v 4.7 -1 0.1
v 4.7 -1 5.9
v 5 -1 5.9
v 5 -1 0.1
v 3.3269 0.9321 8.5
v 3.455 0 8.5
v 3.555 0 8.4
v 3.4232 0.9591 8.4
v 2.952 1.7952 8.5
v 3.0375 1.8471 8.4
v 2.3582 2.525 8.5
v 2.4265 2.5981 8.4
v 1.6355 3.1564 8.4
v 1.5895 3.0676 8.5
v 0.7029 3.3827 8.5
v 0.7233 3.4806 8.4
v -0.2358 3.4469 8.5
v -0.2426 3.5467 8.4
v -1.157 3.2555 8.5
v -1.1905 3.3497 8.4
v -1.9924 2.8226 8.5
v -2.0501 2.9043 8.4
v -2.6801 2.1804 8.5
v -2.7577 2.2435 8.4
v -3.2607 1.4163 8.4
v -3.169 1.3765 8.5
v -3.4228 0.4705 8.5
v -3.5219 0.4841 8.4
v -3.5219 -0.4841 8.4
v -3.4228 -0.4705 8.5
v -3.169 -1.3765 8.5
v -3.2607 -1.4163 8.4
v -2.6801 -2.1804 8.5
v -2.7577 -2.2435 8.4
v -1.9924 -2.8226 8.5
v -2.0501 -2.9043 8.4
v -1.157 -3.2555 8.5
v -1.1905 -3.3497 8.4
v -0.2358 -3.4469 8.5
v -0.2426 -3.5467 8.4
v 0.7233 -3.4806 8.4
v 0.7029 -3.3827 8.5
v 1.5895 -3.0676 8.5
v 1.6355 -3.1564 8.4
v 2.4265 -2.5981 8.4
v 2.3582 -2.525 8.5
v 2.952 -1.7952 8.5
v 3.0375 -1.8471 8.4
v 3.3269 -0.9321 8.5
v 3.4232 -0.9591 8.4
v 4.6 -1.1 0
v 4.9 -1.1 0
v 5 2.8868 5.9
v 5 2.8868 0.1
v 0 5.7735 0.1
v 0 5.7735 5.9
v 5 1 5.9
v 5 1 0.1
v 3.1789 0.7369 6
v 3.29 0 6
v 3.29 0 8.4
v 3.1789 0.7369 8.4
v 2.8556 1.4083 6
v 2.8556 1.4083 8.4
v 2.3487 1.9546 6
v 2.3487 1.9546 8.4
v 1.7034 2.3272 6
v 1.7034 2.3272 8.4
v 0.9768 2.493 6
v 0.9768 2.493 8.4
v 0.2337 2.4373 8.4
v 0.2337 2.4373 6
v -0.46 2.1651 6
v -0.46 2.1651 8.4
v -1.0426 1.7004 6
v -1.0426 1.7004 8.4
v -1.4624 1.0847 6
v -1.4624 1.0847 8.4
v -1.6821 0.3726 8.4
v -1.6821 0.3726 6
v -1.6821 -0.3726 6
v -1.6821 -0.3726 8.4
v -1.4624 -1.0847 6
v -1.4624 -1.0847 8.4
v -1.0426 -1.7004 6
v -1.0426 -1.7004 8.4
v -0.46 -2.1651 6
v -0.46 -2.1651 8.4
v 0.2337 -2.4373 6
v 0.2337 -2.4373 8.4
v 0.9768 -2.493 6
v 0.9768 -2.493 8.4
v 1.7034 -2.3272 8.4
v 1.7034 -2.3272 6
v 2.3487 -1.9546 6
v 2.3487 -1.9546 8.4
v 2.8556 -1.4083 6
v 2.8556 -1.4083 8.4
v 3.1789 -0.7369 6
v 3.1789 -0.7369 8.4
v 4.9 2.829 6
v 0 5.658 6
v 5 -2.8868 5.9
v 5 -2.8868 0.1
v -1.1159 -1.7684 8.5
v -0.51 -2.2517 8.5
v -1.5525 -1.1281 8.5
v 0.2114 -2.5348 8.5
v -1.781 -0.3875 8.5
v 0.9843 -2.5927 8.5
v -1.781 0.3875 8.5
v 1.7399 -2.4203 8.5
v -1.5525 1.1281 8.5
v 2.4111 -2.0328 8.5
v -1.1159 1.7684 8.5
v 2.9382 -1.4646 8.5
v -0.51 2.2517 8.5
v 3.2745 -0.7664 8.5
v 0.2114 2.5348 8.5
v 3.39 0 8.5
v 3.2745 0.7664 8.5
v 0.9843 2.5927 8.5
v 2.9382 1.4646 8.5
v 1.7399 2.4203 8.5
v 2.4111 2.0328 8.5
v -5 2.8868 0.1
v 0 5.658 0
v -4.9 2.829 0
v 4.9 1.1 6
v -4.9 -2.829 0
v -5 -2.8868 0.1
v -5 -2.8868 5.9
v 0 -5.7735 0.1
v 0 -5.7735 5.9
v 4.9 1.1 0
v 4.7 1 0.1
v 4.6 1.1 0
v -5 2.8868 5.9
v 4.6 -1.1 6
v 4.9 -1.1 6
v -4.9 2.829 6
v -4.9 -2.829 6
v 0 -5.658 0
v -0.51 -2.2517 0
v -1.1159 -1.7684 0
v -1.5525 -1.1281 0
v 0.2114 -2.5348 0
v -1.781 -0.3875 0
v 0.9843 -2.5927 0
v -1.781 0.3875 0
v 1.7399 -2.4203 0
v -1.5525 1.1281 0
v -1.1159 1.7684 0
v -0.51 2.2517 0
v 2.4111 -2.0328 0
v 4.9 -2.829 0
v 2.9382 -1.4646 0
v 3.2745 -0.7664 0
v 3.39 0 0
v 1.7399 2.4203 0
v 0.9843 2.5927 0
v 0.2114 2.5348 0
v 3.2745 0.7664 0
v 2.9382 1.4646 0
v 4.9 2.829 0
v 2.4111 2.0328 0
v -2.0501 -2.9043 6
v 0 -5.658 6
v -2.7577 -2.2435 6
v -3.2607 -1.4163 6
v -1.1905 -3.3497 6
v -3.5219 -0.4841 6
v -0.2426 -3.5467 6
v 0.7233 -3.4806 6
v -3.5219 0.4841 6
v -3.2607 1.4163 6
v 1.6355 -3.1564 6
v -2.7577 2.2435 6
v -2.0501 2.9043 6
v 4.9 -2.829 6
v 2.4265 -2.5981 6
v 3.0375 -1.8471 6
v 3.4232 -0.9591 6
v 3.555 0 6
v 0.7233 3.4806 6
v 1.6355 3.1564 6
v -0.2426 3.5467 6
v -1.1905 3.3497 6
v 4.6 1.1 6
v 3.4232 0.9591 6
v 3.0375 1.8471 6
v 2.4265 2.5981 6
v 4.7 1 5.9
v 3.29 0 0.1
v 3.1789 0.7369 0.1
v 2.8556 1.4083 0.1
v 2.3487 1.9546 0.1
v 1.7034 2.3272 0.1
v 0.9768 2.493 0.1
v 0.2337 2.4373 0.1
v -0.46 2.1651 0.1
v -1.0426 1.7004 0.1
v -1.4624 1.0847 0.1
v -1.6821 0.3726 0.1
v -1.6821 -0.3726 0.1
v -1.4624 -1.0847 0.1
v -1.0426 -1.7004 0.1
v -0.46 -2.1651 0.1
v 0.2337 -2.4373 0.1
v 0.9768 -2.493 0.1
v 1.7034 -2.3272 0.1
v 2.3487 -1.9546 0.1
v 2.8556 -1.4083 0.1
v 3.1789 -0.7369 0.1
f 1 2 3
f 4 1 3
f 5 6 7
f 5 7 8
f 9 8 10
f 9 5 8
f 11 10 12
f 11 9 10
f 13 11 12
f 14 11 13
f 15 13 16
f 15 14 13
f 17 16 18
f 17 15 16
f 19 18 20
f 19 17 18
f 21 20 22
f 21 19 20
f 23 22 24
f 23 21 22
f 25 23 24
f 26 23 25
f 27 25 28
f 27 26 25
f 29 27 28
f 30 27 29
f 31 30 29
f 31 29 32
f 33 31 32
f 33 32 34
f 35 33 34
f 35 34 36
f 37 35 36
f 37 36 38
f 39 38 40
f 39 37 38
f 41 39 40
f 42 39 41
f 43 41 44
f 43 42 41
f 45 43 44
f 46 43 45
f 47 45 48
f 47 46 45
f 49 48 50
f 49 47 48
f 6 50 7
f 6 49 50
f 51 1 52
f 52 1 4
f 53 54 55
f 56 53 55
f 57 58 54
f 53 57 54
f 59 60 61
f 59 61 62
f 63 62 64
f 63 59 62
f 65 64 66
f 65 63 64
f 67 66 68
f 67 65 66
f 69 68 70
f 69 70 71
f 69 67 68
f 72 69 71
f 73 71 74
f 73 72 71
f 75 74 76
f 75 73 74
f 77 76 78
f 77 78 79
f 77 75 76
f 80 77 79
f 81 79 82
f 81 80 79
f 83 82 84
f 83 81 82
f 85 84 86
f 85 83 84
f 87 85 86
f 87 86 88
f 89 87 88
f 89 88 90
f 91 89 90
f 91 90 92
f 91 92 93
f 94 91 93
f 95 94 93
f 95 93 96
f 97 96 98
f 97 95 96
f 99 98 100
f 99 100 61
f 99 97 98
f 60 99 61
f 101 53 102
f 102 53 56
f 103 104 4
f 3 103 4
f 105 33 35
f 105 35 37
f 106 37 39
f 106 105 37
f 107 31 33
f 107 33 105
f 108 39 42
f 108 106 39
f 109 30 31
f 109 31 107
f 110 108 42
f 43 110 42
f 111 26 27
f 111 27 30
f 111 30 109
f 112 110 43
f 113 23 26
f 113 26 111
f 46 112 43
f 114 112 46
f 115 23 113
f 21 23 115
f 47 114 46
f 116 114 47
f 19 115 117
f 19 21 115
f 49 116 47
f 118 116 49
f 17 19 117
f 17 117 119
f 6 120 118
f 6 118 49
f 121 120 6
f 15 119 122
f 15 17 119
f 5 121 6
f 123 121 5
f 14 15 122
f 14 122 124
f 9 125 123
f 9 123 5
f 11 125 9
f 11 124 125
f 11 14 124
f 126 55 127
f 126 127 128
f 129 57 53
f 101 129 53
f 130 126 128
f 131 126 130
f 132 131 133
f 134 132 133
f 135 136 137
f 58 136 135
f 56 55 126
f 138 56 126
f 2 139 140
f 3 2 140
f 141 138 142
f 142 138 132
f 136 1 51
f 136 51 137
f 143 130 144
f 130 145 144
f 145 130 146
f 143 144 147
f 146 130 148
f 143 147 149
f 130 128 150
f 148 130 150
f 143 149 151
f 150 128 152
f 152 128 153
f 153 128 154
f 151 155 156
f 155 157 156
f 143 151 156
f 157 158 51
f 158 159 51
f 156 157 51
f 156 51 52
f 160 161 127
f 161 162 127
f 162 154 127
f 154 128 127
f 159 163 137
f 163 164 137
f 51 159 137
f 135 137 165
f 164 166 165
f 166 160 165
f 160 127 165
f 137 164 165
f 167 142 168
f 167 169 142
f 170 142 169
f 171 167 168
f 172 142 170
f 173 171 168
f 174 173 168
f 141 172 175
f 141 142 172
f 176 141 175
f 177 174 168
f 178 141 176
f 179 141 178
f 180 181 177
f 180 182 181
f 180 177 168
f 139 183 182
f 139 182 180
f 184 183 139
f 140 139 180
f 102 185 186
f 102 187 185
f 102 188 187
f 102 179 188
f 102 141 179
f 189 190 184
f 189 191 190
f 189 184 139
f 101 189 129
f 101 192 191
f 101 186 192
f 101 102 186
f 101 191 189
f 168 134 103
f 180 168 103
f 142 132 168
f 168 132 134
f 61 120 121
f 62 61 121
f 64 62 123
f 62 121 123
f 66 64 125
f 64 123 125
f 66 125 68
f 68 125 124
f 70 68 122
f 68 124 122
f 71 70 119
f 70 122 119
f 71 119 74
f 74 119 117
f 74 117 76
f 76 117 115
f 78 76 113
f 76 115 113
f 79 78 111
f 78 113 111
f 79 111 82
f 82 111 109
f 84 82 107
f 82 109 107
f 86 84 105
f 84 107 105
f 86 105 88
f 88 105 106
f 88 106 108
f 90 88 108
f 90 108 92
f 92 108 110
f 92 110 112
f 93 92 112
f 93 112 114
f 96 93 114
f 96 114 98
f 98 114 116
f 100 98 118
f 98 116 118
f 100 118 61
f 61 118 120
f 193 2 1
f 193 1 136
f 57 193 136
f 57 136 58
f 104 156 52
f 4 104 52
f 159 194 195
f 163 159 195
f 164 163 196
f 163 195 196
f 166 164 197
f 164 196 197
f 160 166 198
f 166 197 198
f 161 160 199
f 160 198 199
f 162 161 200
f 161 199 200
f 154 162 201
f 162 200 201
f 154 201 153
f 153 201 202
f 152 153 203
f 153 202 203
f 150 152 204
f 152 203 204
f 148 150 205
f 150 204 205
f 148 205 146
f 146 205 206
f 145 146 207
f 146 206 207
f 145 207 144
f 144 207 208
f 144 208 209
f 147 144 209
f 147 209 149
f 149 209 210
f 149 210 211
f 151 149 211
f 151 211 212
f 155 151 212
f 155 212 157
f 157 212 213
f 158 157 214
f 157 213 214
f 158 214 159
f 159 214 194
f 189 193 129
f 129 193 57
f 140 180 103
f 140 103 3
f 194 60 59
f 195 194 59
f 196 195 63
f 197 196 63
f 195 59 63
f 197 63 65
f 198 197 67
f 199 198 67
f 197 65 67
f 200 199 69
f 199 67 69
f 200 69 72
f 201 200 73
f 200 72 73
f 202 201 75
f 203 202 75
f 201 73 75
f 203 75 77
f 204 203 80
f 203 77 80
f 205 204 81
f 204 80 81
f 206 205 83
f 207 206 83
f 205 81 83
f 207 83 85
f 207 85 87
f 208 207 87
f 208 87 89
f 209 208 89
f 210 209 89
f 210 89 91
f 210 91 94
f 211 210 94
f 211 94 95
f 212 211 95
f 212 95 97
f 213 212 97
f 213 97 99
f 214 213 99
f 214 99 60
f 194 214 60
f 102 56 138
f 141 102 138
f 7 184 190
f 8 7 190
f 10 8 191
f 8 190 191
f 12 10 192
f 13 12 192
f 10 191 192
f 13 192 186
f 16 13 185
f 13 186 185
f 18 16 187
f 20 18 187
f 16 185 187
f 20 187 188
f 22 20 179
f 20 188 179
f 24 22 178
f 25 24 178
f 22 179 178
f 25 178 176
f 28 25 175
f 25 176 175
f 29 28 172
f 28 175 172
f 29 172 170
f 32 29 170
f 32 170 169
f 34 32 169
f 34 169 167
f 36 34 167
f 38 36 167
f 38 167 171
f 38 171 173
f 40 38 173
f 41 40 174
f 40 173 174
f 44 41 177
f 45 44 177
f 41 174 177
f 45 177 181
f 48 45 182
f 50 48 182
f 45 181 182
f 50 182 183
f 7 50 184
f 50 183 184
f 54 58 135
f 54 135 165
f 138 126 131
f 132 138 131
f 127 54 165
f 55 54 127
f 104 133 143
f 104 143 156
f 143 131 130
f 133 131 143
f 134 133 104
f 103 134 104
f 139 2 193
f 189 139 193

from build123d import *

# Parameters (mm, degrees)
F1_DEPTH = 6
F2_R     = 3.555
F2_R_2   = 2.5
F3_DEPTH = 2.5
F4_W     = 0.3
F4_H     = 2
F5_DEPTH = 25
F6_R     = 2.5
F7_DEPTH = 25
F8_SIZE  = 0.1


with BuildPart() as f1:
    # F0 (on Top) → F1 (new body)
    with BuildSketch(Plane.XY):
        Polygon((5, -2.886751), (5, 2.886751), (0, 5.773503), (-5, 2.886751), (-5, -2.886751), (0, -5.773503), align=None)
    extrude(amount=F1_DEPTH)

    # F2 (on face) → F3 (join)
    with BuildSketch(Plane.XY.offset(6)):
        Circle(F2_R)
        with Locations((0.79, 0)):
            Circle(F2_R_2, mode=Mode.SUBTRACT)
    extrude(amount=F3_DEPTH)

    # F4 (on face) → F5 (cut)
    with BuildSketch(Plane.XY.offset(6)):
        with Locations((4.85, 0)):
            Rectangle(F4_W, F4_H)
    extrude(amount=-F5_DEPTH, mode=Mode.SUBTRACT)

    # F6 (on face) → F7 (cut)
    with BuildSketch(Plane.XY.offset(6)):
        with Locations((0.79, 0)):
            Circle(F6_R)
    extrude(amount=-F7_DEPTH, mode=Mode.SUBTRACT)

    # F8
    f8_edges = [f1.edges().sort_by_distance(p)[0] for p in [
        (-2.5, -4.330127, 6),
        (2.5, -4.330127, 6),
        (5, -1.943376, 6),
        (5, 1.943376, 6),
        (4.7, 0, 6),
        (4.85, -1, 6),
        (4.85, 1, 6),
        (2.5, 4.330127, 6),
        (-2.5, 4.330127, 6),
        (-5, 0, 6),
        (-3.555, 0, 8.5),
        (-1.71, 0, 8.5),
        (2.5, -4.330127, 0),
        (-2.5, -4.330127, 0),
        (5, -1.943376, 0),
        (-5, 0, 0),
        (4.85, -1, 0),
        (-2.5, 4.330127, 0),
        (4.7, 0, 0),
        (2.5, 4.330127, 0),
        (4.85, 1, 0),
        (5, 1.943376, 0),
        (-1.71, 0, 0),
    ]]
    chamfer(f8_edges, length=F8_SIZE)


solid = f1.part
